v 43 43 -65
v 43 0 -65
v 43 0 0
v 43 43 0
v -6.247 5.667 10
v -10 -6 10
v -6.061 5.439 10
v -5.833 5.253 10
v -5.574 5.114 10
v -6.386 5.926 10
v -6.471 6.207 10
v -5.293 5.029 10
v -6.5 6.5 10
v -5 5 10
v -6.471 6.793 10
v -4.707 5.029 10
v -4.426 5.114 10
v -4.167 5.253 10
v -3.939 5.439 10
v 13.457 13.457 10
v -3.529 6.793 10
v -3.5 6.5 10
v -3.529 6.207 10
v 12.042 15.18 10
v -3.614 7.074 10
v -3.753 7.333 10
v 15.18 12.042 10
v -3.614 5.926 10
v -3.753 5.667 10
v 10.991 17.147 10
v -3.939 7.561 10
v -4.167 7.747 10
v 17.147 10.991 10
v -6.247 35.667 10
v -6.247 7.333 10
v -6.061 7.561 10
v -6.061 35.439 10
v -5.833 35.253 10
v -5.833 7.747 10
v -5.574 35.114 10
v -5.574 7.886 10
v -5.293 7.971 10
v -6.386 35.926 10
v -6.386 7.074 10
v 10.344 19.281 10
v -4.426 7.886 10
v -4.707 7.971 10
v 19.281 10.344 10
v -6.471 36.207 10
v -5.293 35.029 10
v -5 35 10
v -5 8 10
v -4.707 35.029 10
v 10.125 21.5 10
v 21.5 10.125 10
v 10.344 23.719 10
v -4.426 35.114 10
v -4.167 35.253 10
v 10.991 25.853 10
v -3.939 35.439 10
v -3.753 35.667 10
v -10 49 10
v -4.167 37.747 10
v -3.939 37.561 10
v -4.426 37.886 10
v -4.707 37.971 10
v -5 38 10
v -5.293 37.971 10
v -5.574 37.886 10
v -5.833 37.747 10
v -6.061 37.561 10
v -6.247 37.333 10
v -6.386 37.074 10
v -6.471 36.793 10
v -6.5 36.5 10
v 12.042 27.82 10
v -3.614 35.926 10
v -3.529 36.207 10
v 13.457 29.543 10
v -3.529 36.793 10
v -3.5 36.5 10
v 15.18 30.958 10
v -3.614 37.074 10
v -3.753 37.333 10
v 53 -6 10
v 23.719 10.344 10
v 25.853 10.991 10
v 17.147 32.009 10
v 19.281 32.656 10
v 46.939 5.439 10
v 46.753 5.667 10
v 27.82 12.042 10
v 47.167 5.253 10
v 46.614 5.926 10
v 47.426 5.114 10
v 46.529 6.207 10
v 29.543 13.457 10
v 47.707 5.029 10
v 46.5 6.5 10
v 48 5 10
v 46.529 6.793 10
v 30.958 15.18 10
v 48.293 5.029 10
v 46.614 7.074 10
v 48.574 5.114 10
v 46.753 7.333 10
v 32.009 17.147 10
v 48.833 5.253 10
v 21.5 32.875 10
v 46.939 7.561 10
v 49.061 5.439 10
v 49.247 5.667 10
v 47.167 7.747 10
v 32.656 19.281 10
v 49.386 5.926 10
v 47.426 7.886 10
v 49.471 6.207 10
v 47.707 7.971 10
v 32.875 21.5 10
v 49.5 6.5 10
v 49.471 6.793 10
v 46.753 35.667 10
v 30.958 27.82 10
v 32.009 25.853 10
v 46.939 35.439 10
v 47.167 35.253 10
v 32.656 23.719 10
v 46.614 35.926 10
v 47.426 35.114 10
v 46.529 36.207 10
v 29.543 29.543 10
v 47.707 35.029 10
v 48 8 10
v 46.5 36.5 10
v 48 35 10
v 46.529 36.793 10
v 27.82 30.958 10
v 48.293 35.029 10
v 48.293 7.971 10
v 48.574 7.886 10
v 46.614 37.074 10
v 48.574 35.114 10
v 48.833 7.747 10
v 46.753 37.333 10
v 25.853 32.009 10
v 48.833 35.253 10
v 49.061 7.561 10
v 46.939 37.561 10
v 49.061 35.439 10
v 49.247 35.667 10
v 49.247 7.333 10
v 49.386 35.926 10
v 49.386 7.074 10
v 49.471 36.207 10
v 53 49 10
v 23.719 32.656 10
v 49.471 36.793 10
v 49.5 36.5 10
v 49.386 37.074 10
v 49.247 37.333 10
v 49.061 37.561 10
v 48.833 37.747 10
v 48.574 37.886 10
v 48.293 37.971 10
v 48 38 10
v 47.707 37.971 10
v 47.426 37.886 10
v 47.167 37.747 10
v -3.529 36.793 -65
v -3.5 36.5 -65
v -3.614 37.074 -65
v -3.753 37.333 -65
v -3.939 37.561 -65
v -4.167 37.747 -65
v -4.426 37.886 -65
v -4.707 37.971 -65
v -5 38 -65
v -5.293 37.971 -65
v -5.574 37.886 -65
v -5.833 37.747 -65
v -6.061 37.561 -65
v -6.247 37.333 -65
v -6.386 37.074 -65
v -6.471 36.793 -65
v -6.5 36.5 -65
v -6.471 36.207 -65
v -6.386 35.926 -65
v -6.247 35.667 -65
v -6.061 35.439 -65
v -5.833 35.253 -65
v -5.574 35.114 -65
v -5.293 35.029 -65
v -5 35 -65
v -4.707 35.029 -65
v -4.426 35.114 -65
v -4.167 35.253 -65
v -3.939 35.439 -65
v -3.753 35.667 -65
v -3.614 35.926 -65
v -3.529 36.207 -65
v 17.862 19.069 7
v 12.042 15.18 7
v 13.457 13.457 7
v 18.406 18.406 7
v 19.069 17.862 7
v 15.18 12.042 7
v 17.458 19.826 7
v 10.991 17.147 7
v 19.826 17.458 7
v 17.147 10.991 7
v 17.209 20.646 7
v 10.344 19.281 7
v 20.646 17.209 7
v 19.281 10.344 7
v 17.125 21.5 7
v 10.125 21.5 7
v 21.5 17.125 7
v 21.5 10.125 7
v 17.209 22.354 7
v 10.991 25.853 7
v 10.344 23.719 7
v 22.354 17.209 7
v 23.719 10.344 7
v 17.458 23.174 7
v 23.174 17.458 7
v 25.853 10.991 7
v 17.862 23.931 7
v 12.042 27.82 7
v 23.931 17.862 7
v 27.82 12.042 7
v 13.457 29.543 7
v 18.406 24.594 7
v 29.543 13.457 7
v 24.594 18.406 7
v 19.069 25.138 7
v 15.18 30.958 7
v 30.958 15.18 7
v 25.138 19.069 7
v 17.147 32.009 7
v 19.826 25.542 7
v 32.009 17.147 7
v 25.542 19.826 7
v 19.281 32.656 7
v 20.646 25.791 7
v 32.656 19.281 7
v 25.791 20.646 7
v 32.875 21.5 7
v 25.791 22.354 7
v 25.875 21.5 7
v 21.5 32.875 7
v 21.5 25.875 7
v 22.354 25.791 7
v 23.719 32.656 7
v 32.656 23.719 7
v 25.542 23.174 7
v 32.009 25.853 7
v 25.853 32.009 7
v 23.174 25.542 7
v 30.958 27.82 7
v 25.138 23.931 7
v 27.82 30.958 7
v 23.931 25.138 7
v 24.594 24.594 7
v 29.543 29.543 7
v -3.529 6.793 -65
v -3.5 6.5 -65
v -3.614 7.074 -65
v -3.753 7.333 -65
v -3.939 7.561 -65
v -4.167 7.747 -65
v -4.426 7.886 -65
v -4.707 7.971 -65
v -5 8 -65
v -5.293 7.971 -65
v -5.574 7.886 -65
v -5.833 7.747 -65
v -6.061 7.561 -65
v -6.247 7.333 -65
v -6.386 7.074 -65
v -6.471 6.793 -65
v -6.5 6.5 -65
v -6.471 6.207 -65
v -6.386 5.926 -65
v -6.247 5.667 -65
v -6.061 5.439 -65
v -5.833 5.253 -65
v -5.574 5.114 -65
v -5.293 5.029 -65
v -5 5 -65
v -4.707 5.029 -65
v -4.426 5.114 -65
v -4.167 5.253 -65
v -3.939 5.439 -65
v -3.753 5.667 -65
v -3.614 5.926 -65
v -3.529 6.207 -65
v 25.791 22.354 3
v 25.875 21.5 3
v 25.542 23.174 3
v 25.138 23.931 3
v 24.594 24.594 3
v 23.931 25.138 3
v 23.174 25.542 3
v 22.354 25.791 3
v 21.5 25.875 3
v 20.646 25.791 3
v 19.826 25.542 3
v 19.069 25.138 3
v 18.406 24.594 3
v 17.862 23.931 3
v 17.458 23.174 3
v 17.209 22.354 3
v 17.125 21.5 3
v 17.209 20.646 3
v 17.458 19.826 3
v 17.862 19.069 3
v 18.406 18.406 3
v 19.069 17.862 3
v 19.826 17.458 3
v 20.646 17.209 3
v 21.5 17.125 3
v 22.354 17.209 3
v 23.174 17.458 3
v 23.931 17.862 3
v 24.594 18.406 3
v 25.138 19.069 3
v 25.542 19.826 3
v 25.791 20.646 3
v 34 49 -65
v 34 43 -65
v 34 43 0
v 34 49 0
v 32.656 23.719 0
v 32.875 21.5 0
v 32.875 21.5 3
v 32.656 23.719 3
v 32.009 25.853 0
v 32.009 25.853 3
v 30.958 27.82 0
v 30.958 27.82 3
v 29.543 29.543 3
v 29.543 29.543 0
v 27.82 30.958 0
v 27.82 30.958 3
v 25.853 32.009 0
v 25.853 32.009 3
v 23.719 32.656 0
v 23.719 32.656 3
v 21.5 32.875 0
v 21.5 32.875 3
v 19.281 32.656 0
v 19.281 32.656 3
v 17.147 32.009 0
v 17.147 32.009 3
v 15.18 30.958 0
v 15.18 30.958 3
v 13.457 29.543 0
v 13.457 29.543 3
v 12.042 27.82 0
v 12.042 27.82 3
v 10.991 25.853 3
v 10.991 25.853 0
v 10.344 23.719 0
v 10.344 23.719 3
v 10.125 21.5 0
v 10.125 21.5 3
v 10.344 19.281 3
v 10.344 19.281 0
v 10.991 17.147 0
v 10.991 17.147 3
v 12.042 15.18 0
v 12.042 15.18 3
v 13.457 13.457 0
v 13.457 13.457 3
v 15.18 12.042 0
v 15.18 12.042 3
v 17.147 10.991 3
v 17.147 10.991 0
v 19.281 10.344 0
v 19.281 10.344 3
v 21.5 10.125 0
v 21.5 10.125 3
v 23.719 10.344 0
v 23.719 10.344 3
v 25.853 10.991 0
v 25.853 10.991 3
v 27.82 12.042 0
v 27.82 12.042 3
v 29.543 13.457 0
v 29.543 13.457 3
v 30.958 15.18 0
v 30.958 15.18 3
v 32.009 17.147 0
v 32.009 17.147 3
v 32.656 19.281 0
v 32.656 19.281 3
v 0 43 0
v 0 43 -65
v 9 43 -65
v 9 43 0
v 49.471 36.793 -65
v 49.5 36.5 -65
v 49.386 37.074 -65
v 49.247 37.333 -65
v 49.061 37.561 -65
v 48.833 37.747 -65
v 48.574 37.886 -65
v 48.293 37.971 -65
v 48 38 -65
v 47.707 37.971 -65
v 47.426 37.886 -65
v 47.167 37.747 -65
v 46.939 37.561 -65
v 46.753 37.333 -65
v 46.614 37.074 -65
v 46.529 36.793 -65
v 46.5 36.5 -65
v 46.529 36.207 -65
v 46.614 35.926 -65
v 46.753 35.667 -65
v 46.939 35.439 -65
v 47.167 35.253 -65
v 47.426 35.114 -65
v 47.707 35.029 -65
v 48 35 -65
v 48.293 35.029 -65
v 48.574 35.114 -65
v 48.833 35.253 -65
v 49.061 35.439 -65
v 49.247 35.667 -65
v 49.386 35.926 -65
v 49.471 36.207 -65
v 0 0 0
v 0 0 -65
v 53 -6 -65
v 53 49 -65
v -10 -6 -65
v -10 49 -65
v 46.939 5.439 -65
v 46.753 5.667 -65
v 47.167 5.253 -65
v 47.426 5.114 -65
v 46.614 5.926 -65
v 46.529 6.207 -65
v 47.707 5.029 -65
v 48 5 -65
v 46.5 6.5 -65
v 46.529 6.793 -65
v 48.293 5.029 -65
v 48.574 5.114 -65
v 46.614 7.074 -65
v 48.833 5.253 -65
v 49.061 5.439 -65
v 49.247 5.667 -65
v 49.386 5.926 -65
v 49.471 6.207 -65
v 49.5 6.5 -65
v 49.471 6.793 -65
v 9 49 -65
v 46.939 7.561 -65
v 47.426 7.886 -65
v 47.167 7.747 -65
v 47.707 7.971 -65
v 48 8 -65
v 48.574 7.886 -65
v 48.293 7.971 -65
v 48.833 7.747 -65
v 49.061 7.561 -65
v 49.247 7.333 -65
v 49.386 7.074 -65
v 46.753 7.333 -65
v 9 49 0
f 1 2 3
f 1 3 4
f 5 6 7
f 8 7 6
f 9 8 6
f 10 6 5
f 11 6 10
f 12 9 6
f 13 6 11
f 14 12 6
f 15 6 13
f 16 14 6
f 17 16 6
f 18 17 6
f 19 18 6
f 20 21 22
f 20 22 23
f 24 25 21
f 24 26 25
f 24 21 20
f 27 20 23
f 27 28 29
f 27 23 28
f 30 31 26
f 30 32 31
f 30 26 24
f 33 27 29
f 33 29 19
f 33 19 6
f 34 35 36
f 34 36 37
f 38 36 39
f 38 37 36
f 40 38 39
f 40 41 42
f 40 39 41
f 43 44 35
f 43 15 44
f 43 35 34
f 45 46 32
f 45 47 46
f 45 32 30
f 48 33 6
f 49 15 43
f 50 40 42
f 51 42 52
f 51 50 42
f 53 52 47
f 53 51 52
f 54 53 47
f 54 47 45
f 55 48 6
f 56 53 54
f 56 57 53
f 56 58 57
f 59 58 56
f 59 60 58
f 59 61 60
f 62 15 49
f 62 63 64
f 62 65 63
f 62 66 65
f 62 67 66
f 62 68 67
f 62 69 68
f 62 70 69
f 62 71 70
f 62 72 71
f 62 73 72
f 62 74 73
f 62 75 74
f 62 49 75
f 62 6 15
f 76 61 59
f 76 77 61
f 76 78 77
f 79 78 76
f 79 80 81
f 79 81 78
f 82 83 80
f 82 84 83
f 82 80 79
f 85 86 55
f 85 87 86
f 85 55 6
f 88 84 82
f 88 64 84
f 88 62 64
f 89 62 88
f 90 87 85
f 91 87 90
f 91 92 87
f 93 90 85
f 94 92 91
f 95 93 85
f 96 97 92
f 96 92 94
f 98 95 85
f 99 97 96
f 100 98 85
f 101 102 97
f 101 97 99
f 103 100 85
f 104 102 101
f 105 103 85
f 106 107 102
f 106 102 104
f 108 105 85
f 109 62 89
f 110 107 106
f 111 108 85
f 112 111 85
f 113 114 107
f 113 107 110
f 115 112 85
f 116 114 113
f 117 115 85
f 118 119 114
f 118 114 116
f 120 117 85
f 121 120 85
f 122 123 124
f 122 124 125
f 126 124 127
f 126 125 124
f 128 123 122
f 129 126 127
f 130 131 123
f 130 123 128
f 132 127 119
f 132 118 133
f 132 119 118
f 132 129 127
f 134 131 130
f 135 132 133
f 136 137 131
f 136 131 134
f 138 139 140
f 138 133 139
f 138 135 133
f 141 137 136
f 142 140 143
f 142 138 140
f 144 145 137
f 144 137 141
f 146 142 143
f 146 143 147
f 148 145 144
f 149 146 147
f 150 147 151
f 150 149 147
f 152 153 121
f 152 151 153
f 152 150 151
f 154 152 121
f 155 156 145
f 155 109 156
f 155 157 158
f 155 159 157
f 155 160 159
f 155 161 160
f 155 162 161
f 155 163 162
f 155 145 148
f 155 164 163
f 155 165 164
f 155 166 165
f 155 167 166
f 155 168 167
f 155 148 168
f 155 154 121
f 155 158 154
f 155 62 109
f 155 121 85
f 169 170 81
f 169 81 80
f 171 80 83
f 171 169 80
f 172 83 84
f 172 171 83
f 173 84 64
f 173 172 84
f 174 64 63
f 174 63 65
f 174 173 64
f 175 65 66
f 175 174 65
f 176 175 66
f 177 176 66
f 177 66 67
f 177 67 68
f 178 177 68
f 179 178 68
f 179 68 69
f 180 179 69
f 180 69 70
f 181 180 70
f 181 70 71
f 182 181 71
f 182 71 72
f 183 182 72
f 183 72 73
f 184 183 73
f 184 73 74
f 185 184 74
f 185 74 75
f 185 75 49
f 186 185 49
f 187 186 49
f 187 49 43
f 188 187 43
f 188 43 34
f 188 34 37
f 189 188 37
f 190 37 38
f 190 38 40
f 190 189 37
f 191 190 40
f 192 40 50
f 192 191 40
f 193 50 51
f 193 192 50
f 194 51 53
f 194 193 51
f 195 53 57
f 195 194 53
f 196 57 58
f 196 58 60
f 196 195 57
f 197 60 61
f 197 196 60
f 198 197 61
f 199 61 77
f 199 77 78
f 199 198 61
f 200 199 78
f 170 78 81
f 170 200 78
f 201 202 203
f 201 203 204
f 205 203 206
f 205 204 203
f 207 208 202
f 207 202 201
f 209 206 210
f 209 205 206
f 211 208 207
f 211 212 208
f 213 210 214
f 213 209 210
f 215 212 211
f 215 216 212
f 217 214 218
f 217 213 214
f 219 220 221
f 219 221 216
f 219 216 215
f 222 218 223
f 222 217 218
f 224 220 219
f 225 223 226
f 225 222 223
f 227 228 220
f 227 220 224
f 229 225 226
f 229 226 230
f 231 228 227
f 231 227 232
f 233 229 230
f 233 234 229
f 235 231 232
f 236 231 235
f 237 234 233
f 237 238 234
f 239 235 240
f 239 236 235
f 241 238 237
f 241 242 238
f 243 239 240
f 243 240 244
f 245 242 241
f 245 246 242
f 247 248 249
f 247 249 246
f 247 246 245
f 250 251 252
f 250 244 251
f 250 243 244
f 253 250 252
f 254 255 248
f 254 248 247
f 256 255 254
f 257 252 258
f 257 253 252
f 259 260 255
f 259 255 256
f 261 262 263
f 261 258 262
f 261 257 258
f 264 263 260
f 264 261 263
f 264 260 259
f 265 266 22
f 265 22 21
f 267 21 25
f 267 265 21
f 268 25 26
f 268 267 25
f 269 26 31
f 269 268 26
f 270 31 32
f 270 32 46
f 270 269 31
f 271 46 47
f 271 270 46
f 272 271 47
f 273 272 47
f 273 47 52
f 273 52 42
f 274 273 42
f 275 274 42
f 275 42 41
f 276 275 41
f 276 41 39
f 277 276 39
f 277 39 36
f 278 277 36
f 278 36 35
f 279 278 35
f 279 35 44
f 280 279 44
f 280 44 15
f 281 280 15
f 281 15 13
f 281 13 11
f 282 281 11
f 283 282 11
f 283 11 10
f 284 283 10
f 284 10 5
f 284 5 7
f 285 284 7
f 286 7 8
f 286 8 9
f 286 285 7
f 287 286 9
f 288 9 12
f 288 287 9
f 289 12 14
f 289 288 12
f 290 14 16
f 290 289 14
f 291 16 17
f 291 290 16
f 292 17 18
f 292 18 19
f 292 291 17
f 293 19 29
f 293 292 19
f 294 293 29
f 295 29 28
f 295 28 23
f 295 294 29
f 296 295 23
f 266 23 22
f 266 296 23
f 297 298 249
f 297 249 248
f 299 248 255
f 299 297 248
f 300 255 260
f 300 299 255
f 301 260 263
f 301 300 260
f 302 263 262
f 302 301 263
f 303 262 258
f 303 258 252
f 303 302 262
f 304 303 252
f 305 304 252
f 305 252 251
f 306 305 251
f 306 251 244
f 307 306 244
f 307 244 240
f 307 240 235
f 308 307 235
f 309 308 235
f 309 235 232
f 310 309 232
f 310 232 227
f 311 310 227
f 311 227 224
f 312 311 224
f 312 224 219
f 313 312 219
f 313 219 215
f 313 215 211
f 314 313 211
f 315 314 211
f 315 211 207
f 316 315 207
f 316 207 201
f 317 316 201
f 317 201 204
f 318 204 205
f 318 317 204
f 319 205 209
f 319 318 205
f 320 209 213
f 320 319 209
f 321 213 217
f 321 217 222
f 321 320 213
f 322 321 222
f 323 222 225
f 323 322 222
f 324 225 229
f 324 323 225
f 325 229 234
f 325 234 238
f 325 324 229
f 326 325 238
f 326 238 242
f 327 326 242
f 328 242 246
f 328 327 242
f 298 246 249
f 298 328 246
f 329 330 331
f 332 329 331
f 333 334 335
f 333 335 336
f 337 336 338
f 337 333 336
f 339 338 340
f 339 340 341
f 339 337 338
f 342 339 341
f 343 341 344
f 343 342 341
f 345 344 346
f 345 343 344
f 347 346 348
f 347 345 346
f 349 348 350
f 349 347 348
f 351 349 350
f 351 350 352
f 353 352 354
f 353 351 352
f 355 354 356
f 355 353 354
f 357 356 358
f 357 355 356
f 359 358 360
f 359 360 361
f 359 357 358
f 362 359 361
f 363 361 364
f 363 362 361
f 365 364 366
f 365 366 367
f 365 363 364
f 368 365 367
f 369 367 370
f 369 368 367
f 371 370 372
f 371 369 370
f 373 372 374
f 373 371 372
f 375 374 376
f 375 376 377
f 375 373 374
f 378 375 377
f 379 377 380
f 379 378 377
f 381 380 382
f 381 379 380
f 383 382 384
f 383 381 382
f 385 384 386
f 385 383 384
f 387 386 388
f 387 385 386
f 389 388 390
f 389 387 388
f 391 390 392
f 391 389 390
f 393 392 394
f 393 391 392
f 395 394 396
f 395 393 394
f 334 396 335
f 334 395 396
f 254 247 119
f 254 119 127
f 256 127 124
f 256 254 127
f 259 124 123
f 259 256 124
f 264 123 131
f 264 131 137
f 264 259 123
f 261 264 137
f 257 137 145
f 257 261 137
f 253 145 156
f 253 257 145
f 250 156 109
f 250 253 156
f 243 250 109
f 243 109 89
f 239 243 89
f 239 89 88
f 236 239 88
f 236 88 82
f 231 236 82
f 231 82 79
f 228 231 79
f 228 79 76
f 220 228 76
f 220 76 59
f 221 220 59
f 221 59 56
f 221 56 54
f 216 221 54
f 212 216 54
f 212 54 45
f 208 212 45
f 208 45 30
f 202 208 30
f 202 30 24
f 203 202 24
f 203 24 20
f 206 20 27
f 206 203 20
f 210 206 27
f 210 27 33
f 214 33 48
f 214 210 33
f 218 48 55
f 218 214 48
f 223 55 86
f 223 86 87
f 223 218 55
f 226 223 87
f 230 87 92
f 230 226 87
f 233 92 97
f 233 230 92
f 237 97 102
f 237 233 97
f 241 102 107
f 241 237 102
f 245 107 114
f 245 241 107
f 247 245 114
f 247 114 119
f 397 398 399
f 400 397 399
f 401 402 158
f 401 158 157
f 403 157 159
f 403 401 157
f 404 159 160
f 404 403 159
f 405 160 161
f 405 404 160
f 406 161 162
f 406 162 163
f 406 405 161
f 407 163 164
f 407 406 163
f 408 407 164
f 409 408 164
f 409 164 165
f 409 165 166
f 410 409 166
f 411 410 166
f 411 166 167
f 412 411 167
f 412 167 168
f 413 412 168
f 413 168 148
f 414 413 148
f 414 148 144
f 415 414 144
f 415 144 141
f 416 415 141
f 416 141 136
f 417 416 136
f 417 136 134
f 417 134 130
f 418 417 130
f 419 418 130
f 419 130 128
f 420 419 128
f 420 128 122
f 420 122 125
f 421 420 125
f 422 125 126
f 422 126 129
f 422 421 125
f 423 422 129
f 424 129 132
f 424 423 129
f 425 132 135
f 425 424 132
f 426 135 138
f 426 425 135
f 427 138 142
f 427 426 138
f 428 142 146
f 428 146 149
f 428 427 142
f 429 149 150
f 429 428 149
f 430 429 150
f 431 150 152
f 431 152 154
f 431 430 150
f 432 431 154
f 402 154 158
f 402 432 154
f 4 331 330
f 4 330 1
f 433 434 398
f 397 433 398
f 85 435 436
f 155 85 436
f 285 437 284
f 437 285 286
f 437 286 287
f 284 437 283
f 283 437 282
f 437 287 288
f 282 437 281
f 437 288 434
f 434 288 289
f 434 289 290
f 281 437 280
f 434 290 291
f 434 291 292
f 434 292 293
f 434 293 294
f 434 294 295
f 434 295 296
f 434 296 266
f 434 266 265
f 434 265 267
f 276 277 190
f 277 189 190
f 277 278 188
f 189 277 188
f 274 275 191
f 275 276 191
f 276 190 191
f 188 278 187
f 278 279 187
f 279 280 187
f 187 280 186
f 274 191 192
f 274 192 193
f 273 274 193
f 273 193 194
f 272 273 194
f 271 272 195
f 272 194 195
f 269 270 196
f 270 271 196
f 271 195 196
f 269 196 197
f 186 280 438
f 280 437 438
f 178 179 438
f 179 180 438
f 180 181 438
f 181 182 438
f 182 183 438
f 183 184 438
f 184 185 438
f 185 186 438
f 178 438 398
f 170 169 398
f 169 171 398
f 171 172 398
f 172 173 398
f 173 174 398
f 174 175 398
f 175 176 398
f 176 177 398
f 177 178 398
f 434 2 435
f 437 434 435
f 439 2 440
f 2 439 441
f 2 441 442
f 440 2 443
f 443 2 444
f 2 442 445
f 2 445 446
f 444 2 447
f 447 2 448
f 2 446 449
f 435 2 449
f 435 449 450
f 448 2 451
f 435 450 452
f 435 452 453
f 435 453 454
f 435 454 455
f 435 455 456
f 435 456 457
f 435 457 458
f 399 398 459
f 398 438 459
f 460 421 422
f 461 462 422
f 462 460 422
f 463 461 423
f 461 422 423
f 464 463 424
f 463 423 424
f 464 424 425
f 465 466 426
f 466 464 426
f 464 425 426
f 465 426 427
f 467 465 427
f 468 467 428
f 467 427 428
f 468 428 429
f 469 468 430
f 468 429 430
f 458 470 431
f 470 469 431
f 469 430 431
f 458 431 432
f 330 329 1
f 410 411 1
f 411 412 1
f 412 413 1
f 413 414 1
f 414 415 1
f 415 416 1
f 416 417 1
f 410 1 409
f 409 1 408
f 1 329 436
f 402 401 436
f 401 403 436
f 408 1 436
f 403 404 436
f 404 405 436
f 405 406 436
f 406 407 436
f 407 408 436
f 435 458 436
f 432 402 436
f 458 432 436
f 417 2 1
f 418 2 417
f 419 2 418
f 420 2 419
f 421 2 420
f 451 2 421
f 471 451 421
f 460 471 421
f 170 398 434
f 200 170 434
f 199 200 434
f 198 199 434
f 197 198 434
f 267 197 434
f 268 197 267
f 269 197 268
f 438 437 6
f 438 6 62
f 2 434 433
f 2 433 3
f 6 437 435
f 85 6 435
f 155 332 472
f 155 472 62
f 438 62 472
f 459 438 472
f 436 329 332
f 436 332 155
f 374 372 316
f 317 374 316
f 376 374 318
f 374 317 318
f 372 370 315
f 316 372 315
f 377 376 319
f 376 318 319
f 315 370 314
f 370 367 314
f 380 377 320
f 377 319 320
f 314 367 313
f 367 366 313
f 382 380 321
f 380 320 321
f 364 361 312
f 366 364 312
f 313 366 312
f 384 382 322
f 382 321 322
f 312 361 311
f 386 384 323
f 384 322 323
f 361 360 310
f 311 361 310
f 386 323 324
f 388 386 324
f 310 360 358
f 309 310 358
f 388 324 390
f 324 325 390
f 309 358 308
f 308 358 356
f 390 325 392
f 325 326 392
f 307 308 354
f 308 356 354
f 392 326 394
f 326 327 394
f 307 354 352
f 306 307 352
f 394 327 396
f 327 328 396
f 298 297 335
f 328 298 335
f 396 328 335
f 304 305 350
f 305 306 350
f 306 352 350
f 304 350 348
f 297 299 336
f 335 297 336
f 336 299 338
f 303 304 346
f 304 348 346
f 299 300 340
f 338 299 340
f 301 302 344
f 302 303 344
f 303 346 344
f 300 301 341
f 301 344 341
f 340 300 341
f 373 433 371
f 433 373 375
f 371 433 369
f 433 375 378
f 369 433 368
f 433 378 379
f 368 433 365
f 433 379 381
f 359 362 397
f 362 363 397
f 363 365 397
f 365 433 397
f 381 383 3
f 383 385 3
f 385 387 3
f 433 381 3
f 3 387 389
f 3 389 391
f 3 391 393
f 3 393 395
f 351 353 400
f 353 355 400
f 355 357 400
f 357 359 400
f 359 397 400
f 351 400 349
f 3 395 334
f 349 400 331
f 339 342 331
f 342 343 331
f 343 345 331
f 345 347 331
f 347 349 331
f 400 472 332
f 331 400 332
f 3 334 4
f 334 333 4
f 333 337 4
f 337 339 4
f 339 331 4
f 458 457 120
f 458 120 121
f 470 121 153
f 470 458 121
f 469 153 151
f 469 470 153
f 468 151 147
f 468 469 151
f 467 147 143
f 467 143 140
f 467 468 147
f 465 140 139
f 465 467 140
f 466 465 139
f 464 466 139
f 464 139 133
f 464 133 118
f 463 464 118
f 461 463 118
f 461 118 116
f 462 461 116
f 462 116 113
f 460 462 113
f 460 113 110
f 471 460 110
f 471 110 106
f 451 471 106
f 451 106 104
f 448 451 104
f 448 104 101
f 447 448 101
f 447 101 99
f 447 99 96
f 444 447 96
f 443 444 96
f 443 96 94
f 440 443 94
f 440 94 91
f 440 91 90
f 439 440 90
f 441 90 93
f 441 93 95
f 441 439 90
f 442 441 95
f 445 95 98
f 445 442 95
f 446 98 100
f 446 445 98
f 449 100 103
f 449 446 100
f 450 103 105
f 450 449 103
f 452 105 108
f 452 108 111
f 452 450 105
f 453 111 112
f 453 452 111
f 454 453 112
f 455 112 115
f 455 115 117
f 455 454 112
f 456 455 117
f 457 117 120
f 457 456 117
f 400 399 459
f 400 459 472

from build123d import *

# Parameters (mm, degrees)
SKETCH1_7_W         = 63
SKETCH1_7_H         = 55
SKETCH1_7_R         = 1.5
SKETCH1_7_R_2       = 11.375
BOSS_EXTRUDE3_DEPTH = 10
BOSS_EXTRUDE4_START = -65
SKETCH1_8_W         = 63
SKETCH1_8_H         = 55
SKETCH1_8_R         = 1.5
SKETCH1_8_W_2       = 43
SKETCH1_8_H_2       = 43
BOSS_EXTRUDE4_DEPTH = 65
SKETCH4_W           = 12.5
SKETCH4_H           = 65
CUT_EXTRUDE5_DEPTH  = 6
SKETCH1_15_R        = 11.375
SKETCH1_15_R_2      = 4.375
BOSS_EXTRUDE5_DEPTH = 7
SKETCH1_16_R        = 11.375
SKETCH1_16_R_2      = 4.375
CUT_EXTRUDE7_DEPTH  = 3


with BuildPart() as part:
    # Sketch1<7> → Boss-Extrude3 (new body)
    with BuildSketch(Plane.XY):
        with Locations((21.5, 21.5)):
            Rectangle(SKETCH1_7_W, SKETCH1_7_H)
        with Locations((-5, 36.5)):
            Circle(SKETCH1_7_R, mode=Mode.SUBTRACT)
        with Locations((-5, 6.5)):
            Circle(SKETCH1_7_R, mode=Mode.SUBTRACT)
        with Locations((48, 6.5)):
            Circle(SKETCH1_7_R, mode=Mode.SUBTRACT)
        with Locations((48, 36.5)):
            Circle(SKETCH1_7_R, mode=Mode.SUBTRACT)
        with Locations((21.5, 21.5)):
            Circle(SKETCH1_7_R_2, mode=Mode.SUBTRACT)
    extrude(amount=BOSS_EXTRUDE3_DEPTH)

    # Sketch1<8> → Boss-Extrude4 (add)
    with BuildSketch(Plane.XY.offset(BOSS_EXTRUDE4_START)):
        with Locations((21.5, 21.5)):
            Rectangle(SKETCH1_8_W, SKETCH1_8_H)
        with Locations((48, 6.5)):
            Circle(SKETCH1_8_R, mode=Mode.SUBTRACT)
        with Locations((-5, 6.5)):
            Circle(SKETCH1_8_R, mode=Mode.SUBTRACT)
        with Locations((-5, 36.5)):
            Circle(SKETCH1_8_R, mode=Mode.SUBTRACT)
        with Locations((48, 36.5)):
            Circle(SKETCH1_8_R, mode=Mode.SUBTRACT)
        with Locations((21.5, 21.5)):
            Rectangle(SKETCH1_8_W_2, SKETCH1_8_H_2, mode=Mode.SUBTRACT)
    extrude(amount=BOSS_EXTRUDE4_DEPTH)

    # Sketch4 → Cut-Extrude5 (cut)
    with BuildSketch(Plane.XZ.offset(-43)):
        with Locations((27.75, -32.5)):
            Rectangle(SKETCH4_W, SKETCH4_H)
        with Locations((15.25, -32.5)):
            Rectangle(SKETCH4_W, SKETCH4_H)
    extrude(amount=-CUT_EXTRUDE5_DEPTH, mode=Mode.SUBTRACT)

    # Sketch1<15> → Boss-Extrude5 (add)
    with BuildSketch(Plane.XY):
        with Locations((21.5, 21.5)):
            Circle(SKETCH1_15_R)
        with Locations((21.5, 21.5)):
            Circle(SKETCH1_15_R_2, mode=Mode.SUBTRACT)
    extrude(amount=BOSS_EXTRUDE5_DEPTH)

    # Sketch1<16> → Cut-Extrude7 (cut)
    with BuildSketch(Plane.XY):
        with Locations((21.5, 21.5)):
            Circle(SKETCH1_16_R)
        with Locations((21.5, 21.5)):
            Circle(SKETCH1_16_R_2, mode=Mode.SUBTRACT)
    extrude(amount=CUT_EXTRUDE7_DEPTH, mode=Mode.SUBTRACT)


solid = part.part
